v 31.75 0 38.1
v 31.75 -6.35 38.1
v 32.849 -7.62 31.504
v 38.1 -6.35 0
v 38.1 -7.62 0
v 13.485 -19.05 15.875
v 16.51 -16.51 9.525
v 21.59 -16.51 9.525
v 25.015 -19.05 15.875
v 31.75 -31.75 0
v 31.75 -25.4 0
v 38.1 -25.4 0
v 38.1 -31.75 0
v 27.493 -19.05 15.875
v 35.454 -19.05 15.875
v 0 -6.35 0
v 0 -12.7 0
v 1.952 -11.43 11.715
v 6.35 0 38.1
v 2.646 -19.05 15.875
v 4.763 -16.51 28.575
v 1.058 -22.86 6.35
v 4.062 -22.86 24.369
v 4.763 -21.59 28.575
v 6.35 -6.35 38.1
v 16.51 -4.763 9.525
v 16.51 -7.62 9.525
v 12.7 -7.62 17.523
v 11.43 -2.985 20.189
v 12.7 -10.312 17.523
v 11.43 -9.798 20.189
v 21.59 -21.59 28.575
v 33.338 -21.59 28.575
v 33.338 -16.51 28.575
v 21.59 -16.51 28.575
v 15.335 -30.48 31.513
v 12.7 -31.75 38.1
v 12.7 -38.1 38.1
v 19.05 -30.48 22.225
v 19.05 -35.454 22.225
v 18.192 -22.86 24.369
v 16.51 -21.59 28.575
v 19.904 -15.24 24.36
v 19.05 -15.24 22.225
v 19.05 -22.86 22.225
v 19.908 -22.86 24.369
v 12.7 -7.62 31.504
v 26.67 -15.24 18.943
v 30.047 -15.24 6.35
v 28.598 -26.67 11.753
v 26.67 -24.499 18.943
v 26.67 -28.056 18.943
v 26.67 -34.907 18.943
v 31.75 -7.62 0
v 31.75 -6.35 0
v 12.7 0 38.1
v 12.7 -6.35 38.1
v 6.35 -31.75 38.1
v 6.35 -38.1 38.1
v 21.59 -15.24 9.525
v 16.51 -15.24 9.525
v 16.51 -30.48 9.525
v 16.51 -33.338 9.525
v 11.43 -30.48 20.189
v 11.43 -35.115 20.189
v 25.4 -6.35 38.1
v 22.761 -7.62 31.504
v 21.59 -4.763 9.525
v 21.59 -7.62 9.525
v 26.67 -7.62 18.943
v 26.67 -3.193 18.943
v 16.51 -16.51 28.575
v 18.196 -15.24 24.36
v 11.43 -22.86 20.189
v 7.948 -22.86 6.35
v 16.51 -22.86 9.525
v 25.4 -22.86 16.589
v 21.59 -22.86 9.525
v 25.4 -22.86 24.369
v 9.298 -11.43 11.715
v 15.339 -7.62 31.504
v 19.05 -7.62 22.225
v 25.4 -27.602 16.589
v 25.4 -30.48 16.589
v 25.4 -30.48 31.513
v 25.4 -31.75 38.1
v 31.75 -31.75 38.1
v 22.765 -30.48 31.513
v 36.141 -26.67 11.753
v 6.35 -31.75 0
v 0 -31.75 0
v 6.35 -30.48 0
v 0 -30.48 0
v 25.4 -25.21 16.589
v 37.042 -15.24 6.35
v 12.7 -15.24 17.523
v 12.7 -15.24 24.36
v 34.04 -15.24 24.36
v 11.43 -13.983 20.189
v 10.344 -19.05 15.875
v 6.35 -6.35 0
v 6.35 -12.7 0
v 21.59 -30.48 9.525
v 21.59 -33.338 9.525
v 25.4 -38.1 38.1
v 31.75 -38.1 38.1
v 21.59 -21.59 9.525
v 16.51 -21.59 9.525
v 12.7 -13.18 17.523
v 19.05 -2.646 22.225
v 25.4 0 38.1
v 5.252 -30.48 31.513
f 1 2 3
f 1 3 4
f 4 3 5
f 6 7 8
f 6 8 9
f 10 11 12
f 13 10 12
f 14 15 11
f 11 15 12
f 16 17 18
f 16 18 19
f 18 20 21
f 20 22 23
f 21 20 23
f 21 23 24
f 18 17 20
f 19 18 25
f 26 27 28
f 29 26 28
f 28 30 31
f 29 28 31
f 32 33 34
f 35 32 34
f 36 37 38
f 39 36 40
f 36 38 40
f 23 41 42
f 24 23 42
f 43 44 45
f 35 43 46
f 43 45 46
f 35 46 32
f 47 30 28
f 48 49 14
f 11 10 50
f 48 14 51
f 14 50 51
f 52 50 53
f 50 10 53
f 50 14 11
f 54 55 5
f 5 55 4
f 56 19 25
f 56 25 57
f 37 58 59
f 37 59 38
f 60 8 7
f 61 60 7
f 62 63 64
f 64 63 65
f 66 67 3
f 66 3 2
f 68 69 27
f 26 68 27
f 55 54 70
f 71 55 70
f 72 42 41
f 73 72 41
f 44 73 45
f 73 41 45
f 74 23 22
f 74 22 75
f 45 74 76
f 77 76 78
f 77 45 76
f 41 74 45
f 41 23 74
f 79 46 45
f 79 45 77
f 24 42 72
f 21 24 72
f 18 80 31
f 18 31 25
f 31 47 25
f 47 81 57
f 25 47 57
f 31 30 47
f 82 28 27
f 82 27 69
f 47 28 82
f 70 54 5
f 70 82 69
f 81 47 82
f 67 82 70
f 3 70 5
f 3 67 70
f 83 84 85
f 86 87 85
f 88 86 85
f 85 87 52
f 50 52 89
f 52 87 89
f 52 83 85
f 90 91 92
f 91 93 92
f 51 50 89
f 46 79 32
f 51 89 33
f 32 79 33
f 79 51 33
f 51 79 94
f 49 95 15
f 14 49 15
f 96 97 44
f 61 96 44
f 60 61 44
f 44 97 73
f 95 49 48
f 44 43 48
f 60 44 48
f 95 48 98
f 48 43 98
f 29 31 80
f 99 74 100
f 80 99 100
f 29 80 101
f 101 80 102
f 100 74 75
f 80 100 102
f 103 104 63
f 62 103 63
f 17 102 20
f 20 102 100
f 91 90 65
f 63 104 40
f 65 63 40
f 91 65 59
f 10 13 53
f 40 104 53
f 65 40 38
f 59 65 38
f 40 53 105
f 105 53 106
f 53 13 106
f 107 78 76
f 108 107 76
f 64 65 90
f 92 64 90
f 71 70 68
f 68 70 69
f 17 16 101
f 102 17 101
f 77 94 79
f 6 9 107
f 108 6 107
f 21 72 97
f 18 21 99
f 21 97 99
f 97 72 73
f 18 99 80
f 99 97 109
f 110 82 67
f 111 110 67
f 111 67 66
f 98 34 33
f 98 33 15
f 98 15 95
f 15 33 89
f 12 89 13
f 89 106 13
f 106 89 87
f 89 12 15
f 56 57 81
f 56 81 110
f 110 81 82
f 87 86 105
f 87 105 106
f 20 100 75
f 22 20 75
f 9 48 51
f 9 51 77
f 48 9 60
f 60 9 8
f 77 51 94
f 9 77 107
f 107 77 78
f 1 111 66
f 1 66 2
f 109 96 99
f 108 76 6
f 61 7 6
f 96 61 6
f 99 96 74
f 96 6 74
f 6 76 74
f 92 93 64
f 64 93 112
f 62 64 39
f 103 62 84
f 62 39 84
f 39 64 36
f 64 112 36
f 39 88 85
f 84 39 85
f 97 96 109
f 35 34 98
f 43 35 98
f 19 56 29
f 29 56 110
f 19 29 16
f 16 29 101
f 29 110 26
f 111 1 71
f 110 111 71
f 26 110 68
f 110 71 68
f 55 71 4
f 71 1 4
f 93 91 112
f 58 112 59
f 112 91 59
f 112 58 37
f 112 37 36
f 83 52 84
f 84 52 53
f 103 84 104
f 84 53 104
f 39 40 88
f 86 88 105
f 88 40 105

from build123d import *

# Parameters (mm, degrees)
F0_W      = 38.1
F0_H      = 38.1
F1_DEPTH  = 38.1
F6_DEPTH  = 38.1
F8_DEPTH  = 38.1
F9_W      = 25.4
F9_H      = 7.62
F10_DEPTH = 38.1


with BuildPart() as f1:
    # F0 (on Front) → F1 (new body)
    with BuildSketch(Plane.XZ):
        with Locations((19.05, 19.05)):
            Rectangle(F0_W, F0_H)
    extrude(amount=F1_DEPTH)

    # F5 (on offset) → F6 (cut)
    with BuildSketch(Plane.YZ.offset(38.1)):
        Polygon((-31.75, 0), (-38.1, 38.1), (-38.1, 0), align=None)
        Polygon((-11.43, 11.71486), (-6.35, 38.1), (-31.75, 38.1), (-26.67, 11.752735), (-21.59, 28.575), (-16.51, 28.575), align=None)
        Polygon((-25.4, 0), (-12.7, 0), (-19.05, 15.875), align=None)
        Polygon((-6.35, 0), (0, 0), (0, 38.1), align=None)
    extrude(amount=-F6_DEPTH, mode=Mode.SUBTRACT)

    # F7 (on offset) → F8 (cut)
    with BuildSketch(Plane.XZ.offset(38.1)):
        Polygon((0, 38.1), (0, 0), (6.35, 38.1), align=None)
        Polygon((25.4, 38.1), (12.7, 38.1), (19.05, 22.225), align=None)
        Polygon((31.75, 38.1), (38.1, 0), (38.1, 38.1), align=None)
        Polygon((11.43, 20.18944), (6.35, 0), (31.75, 0), (26.67, 18.943178), (21.59, 9.525), (16.51, 9.525), align=None)
    extrude(amount=-F8_DEPTH, mode=Mode.SUBTRACT)

    # F9 (on offset) → F10 (cut)
    with BuildSketch(Plane.XY.offset(38.1)):
        with Locations((25.4, -11.43)):
            Rectangle(F9_W, F9_H)
        with Locations((12.7, -26.67)):
            Rectangle(F9_W, F9_H)
    extrude(amount=-F10_DEPTH, mode=Mode.SUBTRACT)


solid = f1.part
